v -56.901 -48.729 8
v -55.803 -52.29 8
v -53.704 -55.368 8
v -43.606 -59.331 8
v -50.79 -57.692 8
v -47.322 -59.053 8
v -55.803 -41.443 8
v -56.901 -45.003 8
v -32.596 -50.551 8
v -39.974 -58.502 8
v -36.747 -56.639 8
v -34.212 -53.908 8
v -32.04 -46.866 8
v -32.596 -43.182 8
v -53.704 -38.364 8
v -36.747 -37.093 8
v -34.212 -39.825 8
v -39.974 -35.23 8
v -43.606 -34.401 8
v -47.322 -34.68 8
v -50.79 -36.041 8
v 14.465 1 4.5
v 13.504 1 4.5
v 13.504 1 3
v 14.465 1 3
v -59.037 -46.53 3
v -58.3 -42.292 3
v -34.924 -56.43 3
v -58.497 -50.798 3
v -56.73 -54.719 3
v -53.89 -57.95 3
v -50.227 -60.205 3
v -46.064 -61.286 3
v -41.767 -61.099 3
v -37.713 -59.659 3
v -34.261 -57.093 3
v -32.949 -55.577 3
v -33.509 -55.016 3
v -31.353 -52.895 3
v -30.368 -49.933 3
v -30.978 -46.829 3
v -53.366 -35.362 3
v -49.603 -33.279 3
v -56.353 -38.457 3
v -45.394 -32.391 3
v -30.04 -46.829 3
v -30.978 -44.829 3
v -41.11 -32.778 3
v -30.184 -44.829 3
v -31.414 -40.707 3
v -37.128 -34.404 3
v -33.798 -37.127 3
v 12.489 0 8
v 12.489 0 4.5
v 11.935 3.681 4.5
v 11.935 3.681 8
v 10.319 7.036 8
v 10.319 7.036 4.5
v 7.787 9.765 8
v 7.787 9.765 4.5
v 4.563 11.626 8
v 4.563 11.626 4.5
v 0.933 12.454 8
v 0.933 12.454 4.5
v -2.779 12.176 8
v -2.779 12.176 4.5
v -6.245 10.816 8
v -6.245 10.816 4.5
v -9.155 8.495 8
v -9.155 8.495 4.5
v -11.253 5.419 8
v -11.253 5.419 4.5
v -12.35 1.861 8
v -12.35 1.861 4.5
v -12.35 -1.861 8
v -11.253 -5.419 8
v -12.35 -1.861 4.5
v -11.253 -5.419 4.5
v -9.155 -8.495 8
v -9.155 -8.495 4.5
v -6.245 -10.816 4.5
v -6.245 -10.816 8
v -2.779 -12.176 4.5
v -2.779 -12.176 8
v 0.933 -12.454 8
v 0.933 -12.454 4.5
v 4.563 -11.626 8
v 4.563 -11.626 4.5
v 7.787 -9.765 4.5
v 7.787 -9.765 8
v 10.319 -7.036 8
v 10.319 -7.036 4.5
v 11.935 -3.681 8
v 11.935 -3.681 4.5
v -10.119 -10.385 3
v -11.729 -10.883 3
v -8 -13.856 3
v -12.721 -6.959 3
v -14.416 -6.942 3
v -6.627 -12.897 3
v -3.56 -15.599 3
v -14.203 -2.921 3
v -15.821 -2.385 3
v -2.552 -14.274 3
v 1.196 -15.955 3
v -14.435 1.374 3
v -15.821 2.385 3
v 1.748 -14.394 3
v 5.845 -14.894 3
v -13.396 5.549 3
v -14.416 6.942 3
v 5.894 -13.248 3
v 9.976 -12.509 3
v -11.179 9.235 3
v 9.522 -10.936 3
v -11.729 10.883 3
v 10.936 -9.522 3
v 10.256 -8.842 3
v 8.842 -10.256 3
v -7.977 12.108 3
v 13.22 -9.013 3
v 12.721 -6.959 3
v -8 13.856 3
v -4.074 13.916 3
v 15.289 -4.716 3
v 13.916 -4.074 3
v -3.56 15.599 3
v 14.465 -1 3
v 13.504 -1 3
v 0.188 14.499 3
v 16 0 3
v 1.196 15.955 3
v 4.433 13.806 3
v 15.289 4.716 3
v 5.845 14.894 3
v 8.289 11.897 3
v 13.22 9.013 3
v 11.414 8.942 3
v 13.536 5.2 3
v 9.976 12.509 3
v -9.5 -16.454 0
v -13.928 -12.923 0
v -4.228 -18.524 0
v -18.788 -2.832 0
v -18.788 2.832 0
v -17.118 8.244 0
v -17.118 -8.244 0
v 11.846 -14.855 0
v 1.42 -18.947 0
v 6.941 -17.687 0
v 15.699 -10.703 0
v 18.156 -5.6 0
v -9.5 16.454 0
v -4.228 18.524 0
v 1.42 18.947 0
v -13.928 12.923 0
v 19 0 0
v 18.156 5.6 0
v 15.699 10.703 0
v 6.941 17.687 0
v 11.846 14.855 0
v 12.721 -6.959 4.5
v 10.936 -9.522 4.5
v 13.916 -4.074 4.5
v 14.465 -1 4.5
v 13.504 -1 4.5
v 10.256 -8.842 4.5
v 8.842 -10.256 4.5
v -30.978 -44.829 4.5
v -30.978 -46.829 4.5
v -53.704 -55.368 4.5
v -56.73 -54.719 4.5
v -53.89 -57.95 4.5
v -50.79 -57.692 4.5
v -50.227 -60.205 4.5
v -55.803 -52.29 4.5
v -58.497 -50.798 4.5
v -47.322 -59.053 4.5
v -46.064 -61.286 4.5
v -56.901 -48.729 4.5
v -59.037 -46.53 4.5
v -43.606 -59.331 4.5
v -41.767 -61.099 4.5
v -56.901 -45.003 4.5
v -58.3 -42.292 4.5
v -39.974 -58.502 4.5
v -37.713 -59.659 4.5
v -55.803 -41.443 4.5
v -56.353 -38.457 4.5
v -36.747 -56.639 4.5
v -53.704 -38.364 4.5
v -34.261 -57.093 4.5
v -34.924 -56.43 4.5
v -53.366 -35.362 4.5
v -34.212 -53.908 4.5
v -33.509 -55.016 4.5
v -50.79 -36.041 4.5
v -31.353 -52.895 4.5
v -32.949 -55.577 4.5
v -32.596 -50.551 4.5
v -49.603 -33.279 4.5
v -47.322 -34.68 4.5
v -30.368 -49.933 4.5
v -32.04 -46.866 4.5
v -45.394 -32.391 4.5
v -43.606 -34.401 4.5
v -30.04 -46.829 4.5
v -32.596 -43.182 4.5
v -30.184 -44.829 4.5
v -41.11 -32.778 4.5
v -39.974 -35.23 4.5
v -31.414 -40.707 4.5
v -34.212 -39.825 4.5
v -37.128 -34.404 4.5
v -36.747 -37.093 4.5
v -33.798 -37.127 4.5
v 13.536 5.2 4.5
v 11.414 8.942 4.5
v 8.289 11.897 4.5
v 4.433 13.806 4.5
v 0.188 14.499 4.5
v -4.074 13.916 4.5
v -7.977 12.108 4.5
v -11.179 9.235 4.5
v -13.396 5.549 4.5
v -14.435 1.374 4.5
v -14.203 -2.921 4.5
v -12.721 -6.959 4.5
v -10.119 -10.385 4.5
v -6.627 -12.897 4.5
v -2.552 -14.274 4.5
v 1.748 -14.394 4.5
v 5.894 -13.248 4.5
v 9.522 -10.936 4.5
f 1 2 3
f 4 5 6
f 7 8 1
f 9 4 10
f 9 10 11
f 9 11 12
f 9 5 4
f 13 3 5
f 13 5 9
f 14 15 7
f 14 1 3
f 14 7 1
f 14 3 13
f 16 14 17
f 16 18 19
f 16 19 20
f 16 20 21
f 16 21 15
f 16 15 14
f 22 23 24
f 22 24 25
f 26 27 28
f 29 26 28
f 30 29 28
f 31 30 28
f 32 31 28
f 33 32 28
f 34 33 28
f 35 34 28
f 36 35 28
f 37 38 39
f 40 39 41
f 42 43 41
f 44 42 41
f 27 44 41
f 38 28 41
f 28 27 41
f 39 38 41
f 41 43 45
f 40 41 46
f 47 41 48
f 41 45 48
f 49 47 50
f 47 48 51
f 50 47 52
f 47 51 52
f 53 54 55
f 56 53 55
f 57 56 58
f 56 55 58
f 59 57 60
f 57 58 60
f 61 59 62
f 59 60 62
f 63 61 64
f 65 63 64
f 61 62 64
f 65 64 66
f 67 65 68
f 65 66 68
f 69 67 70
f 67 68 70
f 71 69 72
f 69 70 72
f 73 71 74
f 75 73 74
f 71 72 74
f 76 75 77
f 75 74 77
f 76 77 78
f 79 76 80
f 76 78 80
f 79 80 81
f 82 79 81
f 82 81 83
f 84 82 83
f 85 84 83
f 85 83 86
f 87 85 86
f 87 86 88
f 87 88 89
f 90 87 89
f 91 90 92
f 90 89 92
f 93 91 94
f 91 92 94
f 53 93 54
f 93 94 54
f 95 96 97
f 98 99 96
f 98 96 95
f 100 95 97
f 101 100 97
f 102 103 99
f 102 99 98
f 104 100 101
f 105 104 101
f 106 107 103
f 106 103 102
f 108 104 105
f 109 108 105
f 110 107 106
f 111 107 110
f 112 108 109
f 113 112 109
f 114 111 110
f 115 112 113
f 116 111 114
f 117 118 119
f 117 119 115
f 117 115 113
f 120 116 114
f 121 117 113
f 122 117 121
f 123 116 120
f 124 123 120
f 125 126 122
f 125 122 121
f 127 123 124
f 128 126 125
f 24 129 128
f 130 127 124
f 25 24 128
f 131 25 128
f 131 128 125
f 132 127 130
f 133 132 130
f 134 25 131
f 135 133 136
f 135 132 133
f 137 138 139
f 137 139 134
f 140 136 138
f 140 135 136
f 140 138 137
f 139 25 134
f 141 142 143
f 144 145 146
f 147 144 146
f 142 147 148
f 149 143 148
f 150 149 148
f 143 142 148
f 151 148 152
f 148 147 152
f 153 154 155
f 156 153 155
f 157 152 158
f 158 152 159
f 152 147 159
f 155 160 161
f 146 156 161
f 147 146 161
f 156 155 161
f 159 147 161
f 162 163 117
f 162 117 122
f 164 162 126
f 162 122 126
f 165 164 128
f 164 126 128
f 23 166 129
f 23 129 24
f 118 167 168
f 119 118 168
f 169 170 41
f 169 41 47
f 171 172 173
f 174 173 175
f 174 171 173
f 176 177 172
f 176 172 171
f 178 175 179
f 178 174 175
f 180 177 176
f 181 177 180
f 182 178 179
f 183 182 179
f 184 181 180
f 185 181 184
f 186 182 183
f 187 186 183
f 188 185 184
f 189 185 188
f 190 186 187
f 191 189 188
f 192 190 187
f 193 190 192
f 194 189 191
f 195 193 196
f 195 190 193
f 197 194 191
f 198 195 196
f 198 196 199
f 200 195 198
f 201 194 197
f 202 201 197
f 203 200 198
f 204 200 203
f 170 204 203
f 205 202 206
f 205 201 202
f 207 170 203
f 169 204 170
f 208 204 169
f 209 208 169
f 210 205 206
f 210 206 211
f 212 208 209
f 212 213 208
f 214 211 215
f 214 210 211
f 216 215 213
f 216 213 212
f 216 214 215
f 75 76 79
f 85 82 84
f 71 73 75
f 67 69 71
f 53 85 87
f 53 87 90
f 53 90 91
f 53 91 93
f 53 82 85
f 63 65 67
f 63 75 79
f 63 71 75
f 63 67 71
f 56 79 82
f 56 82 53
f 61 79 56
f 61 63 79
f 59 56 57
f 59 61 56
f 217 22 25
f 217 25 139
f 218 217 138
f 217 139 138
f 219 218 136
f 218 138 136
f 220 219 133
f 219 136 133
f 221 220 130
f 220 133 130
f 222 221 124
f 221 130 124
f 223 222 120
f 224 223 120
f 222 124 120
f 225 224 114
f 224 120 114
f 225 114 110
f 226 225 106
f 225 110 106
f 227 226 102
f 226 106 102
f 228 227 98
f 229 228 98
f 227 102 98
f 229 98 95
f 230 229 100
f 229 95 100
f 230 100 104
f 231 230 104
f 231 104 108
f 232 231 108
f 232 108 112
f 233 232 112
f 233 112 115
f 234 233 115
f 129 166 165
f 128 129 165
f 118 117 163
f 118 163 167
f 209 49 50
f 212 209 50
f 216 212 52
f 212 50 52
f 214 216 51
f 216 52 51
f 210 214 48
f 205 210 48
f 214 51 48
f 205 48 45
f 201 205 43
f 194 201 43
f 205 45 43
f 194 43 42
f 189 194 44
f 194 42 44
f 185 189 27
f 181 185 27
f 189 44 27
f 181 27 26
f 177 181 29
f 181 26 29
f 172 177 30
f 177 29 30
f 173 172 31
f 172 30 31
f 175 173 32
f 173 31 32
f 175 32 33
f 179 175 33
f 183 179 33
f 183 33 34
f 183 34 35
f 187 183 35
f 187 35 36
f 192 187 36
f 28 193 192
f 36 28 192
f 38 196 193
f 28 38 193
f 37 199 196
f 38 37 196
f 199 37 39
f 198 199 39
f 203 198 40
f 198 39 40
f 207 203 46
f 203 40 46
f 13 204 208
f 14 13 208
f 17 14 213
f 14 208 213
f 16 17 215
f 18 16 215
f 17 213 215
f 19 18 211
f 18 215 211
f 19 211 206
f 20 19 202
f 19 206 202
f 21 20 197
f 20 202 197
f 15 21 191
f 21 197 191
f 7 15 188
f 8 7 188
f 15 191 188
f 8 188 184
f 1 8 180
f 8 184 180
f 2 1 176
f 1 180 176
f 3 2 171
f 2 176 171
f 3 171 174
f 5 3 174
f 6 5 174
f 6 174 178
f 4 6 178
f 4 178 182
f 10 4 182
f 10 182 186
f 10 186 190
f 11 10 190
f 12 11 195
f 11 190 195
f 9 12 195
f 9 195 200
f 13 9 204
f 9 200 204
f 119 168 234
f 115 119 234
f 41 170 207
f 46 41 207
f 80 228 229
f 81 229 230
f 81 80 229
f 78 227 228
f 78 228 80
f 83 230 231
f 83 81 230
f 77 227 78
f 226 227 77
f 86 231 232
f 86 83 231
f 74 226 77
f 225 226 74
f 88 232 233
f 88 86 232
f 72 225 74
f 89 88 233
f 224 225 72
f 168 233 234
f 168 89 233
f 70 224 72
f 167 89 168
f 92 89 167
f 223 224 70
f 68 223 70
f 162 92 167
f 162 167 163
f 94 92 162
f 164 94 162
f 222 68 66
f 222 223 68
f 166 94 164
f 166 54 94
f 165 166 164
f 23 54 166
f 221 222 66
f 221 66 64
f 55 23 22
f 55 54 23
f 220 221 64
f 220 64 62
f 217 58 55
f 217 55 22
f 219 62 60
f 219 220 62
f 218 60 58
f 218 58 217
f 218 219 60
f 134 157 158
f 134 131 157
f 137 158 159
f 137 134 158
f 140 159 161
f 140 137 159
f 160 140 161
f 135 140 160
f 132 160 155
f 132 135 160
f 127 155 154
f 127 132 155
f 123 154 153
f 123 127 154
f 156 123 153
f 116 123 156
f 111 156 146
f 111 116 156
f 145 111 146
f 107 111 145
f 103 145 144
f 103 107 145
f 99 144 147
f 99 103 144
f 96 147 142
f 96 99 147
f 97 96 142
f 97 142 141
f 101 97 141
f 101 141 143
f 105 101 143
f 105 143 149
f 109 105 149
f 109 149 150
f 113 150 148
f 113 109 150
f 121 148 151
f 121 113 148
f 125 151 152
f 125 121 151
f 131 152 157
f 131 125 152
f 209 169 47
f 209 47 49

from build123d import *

# Parameters (mm, degrees)
F0_R      = 19
F2_R      = 16
F4_R      = 14.5
F5_DEPTH  = 1.5
F6_R      = 12.489408
F7_DEPTH  = 3.5
F8_W      = 1.060285
F8_H      = 2
F9_DEPTH  = 1.5
F10_R     = 14.5
F11_DEPTH = 1.5
F12_R     = 12.5
F13_DEPTH = 3.5
F14_W     = 1.355736
F14_H     = 2
F15_DEPTH = 1.5


with BuildPart() as f3:
    # F0 (on Top) → F3 section 0
    with BuildSketch(Plane.XY):
        Circle(F0_R)
    # F2 (on offset) → F3 section 1
    with BuildSketch(Plane.XY.offset(3)):
        Circle(F2_R)
    loft()

    # F4 (on face) → F5 (join)
    with BuildSketch(Plane.XY.offset(3)):
        Circle(F4_R)
    extrude(amount=F5_DEPTH)

    # F6 (on face) → F7 (join)
    with BuildSketch(Plane.XY.offset(4.5)):
        Circle(F6_R)
    extrude(amount=F7_DEPTH)

    # F8 (on face) → F9 (cut)
    with BuildSketch(Plane.XY.offset(4.5)):
        Polygon((11.005462, -9.591248), (10.255727, -8.841514), (8.841514, -10.255727), (9.591248, -11.005462), align=None)
        with Locations((14.033931, 0)):
            Rectangle(F8_W, F8_H)
    extrude(amount=-F9_DEPTH, mode=Mode.SUBTRACT)


with BuildPart() as f11:
    # F10 (on offset) → F11 (new body)
    with BuildSketch(Plane.XY.offset(3)):
        with Locations((-44.54045, -46.866324)):
            Circle(F10_R)
    extrude(amount=F11_DEPTH)

    # F12 (on face) → F13 (join)
    with BuildSketch(Plane.XY.offset(4.5)):
        with Locations((-44.54045, -46.866324)):
            Circle(F12_R)
    extrude(amount=F13_DEPTH)

    # F14 (on face) → F15 (cut)
    with BuildSketch(Plane.XY.offset(4.5)):
        Polygon((-32.550831, -55.974755), (-33.509481, -55.016105), (-34.923695, -56.430319), (-33.965045, -57.388969), align=None)
        with Locations((-30.299744, -45.829017)):
            Rectangle(F14_W, F14_H)
    extrude(amount=-F15_DEPTH, mode=Mode.SUBTRACT)


solid = Compound([f3.part, f11.part])
